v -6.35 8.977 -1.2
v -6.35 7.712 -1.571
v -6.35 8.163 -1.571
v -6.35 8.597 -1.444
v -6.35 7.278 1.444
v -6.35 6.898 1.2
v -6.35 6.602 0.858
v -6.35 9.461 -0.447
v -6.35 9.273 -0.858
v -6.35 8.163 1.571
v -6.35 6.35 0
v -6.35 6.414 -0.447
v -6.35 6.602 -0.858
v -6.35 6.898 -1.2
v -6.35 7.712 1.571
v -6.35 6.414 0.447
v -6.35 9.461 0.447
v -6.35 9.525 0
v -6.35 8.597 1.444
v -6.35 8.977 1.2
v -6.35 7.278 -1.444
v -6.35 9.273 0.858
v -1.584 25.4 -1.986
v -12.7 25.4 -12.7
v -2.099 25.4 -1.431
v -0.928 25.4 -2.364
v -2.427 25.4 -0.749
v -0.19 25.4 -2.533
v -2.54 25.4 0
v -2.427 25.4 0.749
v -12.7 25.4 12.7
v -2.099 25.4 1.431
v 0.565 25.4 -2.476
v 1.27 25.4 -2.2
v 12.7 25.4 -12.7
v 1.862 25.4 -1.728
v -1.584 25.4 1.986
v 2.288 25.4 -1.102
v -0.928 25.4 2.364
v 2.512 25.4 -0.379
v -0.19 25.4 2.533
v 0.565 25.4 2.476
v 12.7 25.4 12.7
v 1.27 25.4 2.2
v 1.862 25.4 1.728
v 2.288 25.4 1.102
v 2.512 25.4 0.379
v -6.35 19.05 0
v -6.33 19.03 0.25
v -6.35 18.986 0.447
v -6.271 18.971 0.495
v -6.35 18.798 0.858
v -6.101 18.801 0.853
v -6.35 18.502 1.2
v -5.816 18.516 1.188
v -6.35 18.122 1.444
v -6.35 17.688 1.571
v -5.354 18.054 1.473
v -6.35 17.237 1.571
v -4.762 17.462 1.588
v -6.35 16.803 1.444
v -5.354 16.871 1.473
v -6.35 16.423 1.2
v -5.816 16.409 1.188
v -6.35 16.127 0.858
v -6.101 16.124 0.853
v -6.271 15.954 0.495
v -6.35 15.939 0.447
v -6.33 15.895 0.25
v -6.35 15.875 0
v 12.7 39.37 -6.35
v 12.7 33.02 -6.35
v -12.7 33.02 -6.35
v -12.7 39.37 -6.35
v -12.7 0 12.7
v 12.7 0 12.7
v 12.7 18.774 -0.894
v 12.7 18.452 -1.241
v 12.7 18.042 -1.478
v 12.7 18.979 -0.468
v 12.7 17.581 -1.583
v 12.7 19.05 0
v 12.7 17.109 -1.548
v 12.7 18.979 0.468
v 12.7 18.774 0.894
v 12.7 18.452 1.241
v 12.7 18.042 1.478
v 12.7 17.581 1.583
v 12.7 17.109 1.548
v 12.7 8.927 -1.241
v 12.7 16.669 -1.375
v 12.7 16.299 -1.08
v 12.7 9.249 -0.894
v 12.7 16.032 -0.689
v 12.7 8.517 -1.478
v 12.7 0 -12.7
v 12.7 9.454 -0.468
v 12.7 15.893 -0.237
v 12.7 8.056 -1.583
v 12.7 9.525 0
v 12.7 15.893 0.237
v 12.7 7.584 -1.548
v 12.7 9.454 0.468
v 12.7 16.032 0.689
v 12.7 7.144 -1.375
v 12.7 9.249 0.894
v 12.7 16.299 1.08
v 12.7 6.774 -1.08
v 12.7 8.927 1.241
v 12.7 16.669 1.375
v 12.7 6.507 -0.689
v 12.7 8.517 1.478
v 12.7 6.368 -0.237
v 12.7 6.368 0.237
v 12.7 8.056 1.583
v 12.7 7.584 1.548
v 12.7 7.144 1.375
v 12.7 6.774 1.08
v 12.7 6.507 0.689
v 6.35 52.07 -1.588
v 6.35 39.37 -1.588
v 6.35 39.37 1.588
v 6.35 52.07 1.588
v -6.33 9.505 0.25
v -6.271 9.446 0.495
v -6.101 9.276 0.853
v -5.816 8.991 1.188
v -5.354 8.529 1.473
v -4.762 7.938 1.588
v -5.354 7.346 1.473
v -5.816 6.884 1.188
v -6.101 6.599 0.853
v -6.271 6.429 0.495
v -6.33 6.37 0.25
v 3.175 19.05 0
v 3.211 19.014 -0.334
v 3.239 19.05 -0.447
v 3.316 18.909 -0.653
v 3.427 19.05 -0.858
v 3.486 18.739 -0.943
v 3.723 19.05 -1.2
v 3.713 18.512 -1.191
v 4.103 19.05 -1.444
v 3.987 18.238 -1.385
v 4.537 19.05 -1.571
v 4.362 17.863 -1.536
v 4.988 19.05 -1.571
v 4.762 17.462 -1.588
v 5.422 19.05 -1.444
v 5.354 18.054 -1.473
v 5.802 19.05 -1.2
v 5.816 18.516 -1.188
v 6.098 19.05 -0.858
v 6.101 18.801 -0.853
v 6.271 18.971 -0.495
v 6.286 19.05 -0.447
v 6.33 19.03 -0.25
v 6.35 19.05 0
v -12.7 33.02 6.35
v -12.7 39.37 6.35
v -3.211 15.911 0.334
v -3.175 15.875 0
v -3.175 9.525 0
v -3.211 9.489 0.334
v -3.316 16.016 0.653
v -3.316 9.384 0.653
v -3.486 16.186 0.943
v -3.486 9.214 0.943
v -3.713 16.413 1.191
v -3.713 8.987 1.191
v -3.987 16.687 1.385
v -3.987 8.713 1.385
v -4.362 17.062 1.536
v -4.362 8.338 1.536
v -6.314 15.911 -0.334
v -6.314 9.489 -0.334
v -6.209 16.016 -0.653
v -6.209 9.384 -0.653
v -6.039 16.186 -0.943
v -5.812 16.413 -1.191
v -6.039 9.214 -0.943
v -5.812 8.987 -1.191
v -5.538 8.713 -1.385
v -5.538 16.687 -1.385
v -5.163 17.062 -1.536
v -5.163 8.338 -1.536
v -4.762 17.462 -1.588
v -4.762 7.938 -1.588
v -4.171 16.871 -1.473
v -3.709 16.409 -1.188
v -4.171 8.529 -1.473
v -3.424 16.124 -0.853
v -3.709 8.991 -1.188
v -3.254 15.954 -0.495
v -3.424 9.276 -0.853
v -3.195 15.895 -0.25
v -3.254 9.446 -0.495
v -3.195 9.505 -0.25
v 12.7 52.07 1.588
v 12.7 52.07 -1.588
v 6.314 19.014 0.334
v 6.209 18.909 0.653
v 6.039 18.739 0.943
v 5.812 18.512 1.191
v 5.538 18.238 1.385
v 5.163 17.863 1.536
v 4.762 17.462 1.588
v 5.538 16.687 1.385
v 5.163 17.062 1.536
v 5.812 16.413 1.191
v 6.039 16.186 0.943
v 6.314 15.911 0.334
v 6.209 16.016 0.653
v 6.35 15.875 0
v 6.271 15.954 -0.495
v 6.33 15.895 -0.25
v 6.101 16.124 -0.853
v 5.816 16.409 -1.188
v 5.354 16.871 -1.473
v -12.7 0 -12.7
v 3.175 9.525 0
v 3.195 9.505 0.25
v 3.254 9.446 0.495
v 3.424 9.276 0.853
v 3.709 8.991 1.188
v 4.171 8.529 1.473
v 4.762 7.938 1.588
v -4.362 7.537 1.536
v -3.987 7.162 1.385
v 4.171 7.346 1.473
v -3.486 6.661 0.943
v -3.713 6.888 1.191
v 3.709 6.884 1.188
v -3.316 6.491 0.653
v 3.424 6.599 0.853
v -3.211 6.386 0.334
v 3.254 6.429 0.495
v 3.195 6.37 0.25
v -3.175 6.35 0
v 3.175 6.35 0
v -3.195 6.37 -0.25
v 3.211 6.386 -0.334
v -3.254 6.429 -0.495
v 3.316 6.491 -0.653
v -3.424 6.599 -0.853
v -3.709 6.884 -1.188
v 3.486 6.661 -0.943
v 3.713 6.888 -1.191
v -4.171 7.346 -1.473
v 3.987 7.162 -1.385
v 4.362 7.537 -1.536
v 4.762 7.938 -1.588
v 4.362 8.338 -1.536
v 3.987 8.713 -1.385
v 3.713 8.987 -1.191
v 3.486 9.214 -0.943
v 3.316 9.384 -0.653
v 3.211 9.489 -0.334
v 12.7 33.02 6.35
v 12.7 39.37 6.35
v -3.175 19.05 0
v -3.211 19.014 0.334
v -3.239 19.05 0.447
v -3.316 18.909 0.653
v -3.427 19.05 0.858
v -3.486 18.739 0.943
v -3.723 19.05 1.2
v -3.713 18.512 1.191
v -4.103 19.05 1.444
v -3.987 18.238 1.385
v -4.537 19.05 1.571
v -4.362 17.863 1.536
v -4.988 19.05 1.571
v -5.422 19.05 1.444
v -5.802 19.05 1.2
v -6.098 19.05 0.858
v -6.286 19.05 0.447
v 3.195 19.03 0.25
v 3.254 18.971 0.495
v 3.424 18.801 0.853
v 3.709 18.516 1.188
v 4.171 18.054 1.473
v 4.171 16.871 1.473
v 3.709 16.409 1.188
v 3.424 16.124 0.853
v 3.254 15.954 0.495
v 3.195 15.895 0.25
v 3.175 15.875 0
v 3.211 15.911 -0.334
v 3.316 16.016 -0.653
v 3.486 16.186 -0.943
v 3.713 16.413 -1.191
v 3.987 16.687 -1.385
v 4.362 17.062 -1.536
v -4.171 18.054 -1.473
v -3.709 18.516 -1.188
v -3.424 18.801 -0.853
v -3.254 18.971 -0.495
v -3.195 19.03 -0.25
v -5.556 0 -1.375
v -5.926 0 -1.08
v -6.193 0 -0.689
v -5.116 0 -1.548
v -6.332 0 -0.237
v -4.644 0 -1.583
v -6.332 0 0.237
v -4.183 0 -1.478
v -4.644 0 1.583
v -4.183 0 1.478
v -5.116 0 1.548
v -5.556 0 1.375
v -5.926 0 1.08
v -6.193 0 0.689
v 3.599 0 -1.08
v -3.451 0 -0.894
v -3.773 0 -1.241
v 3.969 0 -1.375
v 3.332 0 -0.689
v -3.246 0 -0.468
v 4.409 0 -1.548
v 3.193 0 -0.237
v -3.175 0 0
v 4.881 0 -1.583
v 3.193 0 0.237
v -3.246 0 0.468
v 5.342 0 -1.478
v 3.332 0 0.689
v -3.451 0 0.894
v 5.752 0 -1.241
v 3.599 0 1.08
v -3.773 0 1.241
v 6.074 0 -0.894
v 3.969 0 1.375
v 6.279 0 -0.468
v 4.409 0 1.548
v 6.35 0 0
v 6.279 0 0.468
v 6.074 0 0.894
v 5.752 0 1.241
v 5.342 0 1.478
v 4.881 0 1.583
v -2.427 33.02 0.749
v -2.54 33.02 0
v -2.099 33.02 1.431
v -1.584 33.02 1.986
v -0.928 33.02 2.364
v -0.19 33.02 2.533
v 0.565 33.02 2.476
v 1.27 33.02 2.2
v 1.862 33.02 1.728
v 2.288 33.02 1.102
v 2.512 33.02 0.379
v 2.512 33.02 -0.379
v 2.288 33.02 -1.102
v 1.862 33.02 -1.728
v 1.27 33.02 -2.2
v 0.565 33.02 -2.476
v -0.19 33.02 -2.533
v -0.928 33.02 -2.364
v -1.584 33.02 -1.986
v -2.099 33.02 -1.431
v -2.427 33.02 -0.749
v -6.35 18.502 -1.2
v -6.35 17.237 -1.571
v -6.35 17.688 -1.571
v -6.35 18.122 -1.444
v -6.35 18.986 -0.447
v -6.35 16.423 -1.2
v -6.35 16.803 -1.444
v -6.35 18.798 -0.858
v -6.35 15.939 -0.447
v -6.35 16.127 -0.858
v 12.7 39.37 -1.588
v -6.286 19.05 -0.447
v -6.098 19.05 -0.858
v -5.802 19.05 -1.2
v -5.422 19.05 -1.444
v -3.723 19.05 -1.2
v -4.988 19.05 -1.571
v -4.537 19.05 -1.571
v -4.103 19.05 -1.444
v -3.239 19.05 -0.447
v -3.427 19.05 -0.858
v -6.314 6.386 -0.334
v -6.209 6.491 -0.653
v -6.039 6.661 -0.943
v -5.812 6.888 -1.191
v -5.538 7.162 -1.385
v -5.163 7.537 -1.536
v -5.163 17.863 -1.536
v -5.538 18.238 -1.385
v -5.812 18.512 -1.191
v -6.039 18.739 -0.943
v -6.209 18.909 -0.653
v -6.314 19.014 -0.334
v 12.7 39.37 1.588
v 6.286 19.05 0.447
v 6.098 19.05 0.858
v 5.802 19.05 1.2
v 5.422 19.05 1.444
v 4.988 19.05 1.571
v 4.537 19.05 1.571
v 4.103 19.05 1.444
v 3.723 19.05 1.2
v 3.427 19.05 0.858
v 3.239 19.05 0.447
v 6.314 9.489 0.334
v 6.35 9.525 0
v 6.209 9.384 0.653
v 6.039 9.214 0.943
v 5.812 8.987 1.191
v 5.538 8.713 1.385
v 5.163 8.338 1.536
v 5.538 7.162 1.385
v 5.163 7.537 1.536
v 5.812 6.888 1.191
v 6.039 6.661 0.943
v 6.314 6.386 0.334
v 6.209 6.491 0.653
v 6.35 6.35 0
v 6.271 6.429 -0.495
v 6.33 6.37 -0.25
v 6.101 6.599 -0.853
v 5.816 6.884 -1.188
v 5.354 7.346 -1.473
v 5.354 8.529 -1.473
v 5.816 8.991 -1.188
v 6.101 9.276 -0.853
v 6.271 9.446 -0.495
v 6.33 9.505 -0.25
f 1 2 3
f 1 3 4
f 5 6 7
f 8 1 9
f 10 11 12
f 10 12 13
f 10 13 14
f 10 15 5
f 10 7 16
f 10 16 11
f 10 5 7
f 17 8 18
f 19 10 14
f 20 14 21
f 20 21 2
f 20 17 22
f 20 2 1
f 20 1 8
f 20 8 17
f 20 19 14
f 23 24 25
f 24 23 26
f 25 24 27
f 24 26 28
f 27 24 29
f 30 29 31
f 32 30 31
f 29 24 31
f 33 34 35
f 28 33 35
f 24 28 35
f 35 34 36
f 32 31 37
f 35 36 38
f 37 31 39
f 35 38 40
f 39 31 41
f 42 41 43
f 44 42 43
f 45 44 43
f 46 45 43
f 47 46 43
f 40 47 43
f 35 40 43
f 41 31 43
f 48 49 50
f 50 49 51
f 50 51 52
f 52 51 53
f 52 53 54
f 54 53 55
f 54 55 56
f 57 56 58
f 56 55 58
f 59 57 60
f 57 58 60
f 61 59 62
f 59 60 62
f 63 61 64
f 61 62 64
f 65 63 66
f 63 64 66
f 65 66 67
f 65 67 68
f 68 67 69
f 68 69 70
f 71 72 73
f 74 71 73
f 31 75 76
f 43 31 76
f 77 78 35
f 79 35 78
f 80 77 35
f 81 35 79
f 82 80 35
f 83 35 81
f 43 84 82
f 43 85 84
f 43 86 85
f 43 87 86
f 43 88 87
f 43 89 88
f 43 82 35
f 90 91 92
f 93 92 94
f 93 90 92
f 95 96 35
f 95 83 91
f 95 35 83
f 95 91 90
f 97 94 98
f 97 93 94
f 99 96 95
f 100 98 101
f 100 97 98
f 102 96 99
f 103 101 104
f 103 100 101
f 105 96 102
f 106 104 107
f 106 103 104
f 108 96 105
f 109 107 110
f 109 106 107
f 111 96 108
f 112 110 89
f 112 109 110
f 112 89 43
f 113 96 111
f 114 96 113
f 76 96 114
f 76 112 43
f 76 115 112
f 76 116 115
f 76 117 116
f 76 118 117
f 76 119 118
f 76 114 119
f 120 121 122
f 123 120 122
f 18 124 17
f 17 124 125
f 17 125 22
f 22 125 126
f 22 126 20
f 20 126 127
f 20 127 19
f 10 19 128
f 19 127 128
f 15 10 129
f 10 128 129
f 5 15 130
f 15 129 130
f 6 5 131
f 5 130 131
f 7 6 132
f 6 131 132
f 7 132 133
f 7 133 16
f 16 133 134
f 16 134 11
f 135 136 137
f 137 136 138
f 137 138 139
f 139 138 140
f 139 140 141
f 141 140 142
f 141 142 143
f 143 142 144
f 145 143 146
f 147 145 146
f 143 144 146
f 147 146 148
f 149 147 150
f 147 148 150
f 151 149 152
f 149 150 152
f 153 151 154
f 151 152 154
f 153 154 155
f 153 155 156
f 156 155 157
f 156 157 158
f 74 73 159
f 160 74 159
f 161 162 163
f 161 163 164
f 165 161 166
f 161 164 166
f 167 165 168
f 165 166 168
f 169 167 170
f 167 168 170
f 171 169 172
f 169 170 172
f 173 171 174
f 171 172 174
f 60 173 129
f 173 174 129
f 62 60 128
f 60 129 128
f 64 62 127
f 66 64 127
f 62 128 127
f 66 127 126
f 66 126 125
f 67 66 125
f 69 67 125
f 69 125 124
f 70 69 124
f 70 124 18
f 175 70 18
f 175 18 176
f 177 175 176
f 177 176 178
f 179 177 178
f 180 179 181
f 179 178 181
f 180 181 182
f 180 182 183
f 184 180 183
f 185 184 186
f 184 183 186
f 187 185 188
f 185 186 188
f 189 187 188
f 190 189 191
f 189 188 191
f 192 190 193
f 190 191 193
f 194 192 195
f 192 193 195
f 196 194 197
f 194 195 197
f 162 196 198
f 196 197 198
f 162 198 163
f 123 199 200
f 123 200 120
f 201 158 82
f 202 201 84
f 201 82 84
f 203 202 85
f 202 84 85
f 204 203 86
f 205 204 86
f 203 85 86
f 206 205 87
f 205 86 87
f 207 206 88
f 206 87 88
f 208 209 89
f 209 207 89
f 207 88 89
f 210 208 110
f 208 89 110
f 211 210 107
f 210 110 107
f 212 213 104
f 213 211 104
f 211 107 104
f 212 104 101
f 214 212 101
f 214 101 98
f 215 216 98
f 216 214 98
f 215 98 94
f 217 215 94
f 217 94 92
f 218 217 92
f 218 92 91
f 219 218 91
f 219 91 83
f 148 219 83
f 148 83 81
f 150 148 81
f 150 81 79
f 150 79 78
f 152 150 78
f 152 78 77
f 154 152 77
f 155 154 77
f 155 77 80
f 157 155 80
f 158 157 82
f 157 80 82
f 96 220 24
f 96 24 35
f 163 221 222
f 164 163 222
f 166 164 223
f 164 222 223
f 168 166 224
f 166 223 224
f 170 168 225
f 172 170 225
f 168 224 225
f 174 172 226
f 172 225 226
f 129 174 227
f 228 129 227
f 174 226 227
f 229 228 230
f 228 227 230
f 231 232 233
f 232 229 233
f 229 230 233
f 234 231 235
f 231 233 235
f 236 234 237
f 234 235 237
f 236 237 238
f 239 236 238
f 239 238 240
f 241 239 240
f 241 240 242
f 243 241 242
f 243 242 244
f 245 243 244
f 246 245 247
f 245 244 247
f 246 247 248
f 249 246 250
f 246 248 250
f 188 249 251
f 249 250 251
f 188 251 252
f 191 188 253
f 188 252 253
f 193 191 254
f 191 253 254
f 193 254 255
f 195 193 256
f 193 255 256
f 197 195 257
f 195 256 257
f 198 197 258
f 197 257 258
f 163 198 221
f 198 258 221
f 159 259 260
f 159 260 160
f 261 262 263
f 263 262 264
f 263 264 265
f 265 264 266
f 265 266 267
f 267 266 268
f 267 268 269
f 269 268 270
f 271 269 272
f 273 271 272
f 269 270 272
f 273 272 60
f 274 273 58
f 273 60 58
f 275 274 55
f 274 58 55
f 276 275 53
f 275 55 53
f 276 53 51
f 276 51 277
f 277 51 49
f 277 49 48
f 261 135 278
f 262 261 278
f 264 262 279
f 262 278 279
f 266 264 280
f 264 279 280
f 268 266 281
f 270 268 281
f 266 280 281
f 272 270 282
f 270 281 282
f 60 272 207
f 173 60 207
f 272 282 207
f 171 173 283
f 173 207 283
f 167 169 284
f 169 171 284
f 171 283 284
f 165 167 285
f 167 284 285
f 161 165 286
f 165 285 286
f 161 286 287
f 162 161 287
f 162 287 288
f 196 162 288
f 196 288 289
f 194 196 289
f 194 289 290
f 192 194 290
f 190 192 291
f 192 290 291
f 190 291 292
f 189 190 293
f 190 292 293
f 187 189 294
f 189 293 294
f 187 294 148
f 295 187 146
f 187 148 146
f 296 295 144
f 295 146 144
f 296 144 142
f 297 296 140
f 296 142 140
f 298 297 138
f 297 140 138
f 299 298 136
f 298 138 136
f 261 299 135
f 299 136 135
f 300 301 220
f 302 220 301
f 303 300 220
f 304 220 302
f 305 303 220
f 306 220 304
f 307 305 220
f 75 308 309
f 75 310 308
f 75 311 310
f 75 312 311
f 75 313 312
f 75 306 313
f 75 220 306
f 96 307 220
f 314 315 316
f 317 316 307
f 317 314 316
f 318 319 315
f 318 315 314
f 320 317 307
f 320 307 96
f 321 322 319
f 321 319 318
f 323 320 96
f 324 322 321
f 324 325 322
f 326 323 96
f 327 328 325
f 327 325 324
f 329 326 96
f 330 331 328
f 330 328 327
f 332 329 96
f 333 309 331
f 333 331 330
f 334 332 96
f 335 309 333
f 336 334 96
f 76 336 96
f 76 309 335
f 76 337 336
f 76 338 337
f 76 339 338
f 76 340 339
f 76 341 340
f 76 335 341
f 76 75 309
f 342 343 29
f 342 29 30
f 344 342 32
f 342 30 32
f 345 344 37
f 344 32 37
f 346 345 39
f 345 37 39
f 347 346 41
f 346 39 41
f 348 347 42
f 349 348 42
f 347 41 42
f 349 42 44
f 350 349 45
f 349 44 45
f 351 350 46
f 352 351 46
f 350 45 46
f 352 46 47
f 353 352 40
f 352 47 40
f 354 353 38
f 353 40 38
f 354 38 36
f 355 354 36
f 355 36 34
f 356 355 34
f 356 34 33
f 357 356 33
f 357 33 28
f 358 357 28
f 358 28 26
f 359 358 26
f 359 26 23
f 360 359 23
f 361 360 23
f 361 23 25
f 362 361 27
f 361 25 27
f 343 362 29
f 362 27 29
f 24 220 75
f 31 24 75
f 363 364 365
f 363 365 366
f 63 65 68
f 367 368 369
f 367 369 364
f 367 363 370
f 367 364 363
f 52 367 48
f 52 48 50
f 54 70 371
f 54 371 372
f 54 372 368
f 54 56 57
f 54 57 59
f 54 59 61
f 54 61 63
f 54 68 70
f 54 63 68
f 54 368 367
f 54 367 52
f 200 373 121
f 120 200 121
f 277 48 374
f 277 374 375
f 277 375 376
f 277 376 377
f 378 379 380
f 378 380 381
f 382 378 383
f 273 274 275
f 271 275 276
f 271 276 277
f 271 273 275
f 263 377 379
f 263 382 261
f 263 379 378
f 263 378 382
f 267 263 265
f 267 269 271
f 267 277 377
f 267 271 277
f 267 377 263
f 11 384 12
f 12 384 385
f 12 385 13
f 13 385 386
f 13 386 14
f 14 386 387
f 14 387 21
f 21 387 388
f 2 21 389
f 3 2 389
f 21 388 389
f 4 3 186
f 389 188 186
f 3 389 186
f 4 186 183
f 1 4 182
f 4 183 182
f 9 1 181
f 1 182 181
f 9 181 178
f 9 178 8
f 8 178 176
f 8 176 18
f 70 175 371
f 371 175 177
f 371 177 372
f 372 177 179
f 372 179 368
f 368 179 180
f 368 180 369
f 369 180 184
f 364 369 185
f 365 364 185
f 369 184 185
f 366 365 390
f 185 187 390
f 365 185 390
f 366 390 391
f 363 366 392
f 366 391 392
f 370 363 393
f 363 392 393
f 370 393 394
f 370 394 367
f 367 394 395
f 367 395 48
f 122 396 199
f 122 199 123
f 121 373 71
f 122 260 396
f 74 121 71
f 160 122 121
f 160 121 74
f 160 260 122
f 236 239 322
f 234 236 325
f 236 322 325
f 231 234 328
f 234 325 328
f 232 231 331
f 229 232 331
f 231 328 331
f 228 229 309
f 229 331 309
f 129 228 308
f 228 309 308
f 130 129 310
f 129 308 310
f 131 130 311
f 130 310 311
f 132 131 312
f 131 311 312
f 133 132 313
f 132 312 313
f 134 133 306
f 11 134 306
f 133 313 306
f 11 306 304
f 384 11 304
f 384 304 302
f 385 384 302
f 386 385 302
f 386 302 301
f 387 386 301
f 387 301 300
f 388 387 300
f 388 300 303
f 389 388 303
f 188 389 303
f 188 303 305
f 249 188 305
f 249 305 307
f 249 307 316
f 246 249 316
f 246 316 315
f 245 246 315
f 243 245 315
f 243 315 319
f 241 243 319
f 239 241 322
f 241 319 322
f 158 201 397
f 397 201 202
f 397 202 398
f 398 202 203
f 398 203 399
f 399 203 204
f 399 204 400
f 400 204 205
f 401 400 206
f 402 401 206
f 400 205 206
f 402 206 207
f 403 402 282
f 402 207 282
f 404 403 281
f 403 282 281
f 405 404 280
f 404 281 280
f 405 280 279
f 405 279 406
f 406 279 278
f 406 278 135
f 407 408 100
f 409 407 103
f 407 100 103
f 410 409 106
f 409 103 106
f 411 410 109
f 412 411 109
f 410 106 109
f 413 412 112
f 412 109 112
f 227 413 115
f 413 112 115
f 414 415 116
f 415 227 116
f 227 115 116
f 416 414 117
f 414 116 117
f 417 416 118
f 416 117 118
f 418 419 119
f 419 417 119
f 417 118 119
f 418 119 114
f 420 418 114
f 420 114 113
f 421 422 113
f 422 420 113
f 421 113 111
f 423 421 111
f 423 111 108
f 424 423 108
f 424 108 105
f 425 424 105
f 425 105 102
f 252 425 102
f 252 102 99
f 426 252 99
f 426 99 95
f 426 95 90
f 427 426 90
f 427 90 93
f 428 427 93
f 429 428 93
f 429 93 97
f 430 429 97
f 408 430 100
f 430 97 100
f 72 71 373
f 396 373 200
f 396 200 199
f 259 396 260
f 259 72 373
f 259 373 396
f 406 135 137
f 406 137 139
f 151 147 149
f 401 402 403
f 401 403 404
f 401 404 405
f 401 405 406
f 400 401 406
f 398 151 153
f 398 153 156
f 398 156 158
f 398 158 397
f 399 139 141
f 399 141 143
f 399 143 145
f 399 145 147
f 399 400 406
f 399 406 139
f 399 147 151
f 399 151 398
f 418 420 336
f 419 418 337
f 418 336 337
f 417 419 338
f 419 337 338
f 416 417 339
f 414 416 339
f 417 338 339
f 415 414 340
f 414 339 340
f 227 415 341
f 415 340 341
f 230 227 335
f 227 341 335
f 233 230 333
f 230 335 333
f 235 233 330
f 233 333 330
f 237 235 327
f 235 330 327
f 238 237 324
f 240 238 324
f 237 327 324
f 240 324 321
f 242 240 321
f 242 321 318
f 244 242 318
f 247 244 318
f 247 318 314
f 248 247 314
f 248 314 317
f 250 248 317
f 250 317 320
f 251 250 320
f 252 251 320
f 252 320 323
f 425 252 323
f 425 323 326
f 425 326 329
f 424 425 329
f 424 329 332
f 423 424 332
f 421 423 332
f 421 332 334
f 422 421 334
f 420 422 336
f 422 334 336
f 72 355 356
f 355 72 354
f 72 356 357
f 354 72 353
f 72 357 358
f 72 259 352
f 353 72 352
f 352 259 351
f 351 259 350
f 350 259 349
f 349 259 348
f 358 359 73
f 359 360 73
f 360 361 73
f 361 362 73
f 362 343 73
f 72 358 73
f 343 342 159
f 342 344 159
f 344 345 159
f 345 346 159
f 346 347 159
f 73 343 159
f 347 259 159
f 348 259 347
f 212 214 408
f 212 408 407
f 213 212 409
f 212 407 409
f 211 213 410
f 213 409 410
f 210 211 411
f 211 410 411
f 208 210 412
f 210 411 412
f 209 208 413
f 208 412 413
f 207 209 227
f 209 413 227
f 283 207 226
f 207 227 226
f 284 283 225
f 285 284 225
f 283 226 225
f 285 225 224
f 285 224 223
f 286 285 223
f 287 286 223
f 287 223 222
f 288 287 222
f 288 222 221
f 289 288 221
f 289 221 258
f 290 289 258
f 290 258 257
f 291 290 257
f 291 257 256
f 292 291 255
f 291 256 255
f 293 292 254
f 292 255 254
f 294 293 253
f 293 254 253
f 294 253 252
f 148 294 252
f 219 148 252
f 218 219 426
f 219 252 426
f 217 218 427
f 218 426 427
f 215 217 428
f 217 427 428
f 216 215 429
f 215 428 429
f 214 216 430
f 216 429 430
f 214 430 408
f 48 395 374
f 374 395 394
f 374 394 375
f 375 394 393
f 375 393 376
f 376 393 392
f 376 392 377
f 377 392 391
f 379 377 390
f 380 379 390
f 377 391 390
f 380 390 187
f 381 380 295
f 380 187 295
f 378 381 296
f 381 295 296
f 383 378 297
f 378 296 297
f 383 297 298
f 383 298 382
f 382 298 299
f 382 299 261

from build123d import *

# Parameters (mm, degrees)
F0_W      = 25.4
F0_H      = 25.4
F0_R      = 1.5875
F1_DEPTH  = 25.4
F2_R      = 2.54
F3_DEPTH  = 7.62
F4_W      = 25.4
F4_H      = 12.7
F5_DEPTH  = 6.35
F6_W      = 6.35
F6_H      = 3.175
F7_DEPTH  = 12.7
F8_DEPTH  = 19.05
F9_R      = 1.5875
F10_DEPTH = 19.05


with BuildPart() as f1:
    # F0 (on Front) → F1 (new body)
    with BuildSketch(Plane.XZ):
        Rectangle(F0_W, F0_H)
        with Locations((-4.7625, 0)):
            Circle(F0_R, mode=Mode.SUBTRACT)
        with Locations((4.7625, 0)):
            Circle(F0_R, mode=Mode.SUBTRACT)
        with Locations((-4.7625, 0)):
            Circle(F0_R)
        with Locations((4.7625, 0)):
            Circle(F0_R)
    extrude(amount=-F1_DEPTH)

    # F2 (on face) → F3 (join)
    with BuildSketch(Plane(origin=(0, 25.4, 0), x_dir=(-1, 0, 0), z_dir=(0, 1, 0))):
        Circle(F2_R)
    extrude(amount=F3_DEPTH)

    # F4 (on face) → F5 (join)
    with BuildSketch(Plane(origin=(0, 33.02, 0), x_dir=(-1, 0, 0), z_dir=(0, 1, 0))):
        Rectangle(F4_W, F4_H)
    extrude(amount=F5_DEPTH)

    # F6 (on face) → F7 (join)
    with BuildSketch(Plane(origin=(0, 39.37, 0), x_dir=(-1, 0, 0), z_dir=(0, 1, 0))):
        with Locations((-9.525, 0)):
            Rectangle(F6_W, F6_H)
    extrude(amount=F7_DEPTH)

    # F0 (on Front) → F8 (cut)
    with BuildSketch(Plane.XZ):
        with Locations((-4.7625, 0)):
            Circle(F0_R)
        with Locations((4.7625, 0)):
            Circle(F0_R)
    extrude(amount=-F8_DEPTH, mode=Mode.SUBTRACT)

    # F9 (on face) → F10 (cut)
    with BuildSketch(Plane.YZ.offset(12.7)):
        with Locations((7.9375, 0)):
            Circle(F9_R)
        with Locations((17.4625, 0)):
            Circle(F9_R)
    extrude(amount=-F10_DEPTH, mode=Mode.SUBTRACT)


solid = f1.part
